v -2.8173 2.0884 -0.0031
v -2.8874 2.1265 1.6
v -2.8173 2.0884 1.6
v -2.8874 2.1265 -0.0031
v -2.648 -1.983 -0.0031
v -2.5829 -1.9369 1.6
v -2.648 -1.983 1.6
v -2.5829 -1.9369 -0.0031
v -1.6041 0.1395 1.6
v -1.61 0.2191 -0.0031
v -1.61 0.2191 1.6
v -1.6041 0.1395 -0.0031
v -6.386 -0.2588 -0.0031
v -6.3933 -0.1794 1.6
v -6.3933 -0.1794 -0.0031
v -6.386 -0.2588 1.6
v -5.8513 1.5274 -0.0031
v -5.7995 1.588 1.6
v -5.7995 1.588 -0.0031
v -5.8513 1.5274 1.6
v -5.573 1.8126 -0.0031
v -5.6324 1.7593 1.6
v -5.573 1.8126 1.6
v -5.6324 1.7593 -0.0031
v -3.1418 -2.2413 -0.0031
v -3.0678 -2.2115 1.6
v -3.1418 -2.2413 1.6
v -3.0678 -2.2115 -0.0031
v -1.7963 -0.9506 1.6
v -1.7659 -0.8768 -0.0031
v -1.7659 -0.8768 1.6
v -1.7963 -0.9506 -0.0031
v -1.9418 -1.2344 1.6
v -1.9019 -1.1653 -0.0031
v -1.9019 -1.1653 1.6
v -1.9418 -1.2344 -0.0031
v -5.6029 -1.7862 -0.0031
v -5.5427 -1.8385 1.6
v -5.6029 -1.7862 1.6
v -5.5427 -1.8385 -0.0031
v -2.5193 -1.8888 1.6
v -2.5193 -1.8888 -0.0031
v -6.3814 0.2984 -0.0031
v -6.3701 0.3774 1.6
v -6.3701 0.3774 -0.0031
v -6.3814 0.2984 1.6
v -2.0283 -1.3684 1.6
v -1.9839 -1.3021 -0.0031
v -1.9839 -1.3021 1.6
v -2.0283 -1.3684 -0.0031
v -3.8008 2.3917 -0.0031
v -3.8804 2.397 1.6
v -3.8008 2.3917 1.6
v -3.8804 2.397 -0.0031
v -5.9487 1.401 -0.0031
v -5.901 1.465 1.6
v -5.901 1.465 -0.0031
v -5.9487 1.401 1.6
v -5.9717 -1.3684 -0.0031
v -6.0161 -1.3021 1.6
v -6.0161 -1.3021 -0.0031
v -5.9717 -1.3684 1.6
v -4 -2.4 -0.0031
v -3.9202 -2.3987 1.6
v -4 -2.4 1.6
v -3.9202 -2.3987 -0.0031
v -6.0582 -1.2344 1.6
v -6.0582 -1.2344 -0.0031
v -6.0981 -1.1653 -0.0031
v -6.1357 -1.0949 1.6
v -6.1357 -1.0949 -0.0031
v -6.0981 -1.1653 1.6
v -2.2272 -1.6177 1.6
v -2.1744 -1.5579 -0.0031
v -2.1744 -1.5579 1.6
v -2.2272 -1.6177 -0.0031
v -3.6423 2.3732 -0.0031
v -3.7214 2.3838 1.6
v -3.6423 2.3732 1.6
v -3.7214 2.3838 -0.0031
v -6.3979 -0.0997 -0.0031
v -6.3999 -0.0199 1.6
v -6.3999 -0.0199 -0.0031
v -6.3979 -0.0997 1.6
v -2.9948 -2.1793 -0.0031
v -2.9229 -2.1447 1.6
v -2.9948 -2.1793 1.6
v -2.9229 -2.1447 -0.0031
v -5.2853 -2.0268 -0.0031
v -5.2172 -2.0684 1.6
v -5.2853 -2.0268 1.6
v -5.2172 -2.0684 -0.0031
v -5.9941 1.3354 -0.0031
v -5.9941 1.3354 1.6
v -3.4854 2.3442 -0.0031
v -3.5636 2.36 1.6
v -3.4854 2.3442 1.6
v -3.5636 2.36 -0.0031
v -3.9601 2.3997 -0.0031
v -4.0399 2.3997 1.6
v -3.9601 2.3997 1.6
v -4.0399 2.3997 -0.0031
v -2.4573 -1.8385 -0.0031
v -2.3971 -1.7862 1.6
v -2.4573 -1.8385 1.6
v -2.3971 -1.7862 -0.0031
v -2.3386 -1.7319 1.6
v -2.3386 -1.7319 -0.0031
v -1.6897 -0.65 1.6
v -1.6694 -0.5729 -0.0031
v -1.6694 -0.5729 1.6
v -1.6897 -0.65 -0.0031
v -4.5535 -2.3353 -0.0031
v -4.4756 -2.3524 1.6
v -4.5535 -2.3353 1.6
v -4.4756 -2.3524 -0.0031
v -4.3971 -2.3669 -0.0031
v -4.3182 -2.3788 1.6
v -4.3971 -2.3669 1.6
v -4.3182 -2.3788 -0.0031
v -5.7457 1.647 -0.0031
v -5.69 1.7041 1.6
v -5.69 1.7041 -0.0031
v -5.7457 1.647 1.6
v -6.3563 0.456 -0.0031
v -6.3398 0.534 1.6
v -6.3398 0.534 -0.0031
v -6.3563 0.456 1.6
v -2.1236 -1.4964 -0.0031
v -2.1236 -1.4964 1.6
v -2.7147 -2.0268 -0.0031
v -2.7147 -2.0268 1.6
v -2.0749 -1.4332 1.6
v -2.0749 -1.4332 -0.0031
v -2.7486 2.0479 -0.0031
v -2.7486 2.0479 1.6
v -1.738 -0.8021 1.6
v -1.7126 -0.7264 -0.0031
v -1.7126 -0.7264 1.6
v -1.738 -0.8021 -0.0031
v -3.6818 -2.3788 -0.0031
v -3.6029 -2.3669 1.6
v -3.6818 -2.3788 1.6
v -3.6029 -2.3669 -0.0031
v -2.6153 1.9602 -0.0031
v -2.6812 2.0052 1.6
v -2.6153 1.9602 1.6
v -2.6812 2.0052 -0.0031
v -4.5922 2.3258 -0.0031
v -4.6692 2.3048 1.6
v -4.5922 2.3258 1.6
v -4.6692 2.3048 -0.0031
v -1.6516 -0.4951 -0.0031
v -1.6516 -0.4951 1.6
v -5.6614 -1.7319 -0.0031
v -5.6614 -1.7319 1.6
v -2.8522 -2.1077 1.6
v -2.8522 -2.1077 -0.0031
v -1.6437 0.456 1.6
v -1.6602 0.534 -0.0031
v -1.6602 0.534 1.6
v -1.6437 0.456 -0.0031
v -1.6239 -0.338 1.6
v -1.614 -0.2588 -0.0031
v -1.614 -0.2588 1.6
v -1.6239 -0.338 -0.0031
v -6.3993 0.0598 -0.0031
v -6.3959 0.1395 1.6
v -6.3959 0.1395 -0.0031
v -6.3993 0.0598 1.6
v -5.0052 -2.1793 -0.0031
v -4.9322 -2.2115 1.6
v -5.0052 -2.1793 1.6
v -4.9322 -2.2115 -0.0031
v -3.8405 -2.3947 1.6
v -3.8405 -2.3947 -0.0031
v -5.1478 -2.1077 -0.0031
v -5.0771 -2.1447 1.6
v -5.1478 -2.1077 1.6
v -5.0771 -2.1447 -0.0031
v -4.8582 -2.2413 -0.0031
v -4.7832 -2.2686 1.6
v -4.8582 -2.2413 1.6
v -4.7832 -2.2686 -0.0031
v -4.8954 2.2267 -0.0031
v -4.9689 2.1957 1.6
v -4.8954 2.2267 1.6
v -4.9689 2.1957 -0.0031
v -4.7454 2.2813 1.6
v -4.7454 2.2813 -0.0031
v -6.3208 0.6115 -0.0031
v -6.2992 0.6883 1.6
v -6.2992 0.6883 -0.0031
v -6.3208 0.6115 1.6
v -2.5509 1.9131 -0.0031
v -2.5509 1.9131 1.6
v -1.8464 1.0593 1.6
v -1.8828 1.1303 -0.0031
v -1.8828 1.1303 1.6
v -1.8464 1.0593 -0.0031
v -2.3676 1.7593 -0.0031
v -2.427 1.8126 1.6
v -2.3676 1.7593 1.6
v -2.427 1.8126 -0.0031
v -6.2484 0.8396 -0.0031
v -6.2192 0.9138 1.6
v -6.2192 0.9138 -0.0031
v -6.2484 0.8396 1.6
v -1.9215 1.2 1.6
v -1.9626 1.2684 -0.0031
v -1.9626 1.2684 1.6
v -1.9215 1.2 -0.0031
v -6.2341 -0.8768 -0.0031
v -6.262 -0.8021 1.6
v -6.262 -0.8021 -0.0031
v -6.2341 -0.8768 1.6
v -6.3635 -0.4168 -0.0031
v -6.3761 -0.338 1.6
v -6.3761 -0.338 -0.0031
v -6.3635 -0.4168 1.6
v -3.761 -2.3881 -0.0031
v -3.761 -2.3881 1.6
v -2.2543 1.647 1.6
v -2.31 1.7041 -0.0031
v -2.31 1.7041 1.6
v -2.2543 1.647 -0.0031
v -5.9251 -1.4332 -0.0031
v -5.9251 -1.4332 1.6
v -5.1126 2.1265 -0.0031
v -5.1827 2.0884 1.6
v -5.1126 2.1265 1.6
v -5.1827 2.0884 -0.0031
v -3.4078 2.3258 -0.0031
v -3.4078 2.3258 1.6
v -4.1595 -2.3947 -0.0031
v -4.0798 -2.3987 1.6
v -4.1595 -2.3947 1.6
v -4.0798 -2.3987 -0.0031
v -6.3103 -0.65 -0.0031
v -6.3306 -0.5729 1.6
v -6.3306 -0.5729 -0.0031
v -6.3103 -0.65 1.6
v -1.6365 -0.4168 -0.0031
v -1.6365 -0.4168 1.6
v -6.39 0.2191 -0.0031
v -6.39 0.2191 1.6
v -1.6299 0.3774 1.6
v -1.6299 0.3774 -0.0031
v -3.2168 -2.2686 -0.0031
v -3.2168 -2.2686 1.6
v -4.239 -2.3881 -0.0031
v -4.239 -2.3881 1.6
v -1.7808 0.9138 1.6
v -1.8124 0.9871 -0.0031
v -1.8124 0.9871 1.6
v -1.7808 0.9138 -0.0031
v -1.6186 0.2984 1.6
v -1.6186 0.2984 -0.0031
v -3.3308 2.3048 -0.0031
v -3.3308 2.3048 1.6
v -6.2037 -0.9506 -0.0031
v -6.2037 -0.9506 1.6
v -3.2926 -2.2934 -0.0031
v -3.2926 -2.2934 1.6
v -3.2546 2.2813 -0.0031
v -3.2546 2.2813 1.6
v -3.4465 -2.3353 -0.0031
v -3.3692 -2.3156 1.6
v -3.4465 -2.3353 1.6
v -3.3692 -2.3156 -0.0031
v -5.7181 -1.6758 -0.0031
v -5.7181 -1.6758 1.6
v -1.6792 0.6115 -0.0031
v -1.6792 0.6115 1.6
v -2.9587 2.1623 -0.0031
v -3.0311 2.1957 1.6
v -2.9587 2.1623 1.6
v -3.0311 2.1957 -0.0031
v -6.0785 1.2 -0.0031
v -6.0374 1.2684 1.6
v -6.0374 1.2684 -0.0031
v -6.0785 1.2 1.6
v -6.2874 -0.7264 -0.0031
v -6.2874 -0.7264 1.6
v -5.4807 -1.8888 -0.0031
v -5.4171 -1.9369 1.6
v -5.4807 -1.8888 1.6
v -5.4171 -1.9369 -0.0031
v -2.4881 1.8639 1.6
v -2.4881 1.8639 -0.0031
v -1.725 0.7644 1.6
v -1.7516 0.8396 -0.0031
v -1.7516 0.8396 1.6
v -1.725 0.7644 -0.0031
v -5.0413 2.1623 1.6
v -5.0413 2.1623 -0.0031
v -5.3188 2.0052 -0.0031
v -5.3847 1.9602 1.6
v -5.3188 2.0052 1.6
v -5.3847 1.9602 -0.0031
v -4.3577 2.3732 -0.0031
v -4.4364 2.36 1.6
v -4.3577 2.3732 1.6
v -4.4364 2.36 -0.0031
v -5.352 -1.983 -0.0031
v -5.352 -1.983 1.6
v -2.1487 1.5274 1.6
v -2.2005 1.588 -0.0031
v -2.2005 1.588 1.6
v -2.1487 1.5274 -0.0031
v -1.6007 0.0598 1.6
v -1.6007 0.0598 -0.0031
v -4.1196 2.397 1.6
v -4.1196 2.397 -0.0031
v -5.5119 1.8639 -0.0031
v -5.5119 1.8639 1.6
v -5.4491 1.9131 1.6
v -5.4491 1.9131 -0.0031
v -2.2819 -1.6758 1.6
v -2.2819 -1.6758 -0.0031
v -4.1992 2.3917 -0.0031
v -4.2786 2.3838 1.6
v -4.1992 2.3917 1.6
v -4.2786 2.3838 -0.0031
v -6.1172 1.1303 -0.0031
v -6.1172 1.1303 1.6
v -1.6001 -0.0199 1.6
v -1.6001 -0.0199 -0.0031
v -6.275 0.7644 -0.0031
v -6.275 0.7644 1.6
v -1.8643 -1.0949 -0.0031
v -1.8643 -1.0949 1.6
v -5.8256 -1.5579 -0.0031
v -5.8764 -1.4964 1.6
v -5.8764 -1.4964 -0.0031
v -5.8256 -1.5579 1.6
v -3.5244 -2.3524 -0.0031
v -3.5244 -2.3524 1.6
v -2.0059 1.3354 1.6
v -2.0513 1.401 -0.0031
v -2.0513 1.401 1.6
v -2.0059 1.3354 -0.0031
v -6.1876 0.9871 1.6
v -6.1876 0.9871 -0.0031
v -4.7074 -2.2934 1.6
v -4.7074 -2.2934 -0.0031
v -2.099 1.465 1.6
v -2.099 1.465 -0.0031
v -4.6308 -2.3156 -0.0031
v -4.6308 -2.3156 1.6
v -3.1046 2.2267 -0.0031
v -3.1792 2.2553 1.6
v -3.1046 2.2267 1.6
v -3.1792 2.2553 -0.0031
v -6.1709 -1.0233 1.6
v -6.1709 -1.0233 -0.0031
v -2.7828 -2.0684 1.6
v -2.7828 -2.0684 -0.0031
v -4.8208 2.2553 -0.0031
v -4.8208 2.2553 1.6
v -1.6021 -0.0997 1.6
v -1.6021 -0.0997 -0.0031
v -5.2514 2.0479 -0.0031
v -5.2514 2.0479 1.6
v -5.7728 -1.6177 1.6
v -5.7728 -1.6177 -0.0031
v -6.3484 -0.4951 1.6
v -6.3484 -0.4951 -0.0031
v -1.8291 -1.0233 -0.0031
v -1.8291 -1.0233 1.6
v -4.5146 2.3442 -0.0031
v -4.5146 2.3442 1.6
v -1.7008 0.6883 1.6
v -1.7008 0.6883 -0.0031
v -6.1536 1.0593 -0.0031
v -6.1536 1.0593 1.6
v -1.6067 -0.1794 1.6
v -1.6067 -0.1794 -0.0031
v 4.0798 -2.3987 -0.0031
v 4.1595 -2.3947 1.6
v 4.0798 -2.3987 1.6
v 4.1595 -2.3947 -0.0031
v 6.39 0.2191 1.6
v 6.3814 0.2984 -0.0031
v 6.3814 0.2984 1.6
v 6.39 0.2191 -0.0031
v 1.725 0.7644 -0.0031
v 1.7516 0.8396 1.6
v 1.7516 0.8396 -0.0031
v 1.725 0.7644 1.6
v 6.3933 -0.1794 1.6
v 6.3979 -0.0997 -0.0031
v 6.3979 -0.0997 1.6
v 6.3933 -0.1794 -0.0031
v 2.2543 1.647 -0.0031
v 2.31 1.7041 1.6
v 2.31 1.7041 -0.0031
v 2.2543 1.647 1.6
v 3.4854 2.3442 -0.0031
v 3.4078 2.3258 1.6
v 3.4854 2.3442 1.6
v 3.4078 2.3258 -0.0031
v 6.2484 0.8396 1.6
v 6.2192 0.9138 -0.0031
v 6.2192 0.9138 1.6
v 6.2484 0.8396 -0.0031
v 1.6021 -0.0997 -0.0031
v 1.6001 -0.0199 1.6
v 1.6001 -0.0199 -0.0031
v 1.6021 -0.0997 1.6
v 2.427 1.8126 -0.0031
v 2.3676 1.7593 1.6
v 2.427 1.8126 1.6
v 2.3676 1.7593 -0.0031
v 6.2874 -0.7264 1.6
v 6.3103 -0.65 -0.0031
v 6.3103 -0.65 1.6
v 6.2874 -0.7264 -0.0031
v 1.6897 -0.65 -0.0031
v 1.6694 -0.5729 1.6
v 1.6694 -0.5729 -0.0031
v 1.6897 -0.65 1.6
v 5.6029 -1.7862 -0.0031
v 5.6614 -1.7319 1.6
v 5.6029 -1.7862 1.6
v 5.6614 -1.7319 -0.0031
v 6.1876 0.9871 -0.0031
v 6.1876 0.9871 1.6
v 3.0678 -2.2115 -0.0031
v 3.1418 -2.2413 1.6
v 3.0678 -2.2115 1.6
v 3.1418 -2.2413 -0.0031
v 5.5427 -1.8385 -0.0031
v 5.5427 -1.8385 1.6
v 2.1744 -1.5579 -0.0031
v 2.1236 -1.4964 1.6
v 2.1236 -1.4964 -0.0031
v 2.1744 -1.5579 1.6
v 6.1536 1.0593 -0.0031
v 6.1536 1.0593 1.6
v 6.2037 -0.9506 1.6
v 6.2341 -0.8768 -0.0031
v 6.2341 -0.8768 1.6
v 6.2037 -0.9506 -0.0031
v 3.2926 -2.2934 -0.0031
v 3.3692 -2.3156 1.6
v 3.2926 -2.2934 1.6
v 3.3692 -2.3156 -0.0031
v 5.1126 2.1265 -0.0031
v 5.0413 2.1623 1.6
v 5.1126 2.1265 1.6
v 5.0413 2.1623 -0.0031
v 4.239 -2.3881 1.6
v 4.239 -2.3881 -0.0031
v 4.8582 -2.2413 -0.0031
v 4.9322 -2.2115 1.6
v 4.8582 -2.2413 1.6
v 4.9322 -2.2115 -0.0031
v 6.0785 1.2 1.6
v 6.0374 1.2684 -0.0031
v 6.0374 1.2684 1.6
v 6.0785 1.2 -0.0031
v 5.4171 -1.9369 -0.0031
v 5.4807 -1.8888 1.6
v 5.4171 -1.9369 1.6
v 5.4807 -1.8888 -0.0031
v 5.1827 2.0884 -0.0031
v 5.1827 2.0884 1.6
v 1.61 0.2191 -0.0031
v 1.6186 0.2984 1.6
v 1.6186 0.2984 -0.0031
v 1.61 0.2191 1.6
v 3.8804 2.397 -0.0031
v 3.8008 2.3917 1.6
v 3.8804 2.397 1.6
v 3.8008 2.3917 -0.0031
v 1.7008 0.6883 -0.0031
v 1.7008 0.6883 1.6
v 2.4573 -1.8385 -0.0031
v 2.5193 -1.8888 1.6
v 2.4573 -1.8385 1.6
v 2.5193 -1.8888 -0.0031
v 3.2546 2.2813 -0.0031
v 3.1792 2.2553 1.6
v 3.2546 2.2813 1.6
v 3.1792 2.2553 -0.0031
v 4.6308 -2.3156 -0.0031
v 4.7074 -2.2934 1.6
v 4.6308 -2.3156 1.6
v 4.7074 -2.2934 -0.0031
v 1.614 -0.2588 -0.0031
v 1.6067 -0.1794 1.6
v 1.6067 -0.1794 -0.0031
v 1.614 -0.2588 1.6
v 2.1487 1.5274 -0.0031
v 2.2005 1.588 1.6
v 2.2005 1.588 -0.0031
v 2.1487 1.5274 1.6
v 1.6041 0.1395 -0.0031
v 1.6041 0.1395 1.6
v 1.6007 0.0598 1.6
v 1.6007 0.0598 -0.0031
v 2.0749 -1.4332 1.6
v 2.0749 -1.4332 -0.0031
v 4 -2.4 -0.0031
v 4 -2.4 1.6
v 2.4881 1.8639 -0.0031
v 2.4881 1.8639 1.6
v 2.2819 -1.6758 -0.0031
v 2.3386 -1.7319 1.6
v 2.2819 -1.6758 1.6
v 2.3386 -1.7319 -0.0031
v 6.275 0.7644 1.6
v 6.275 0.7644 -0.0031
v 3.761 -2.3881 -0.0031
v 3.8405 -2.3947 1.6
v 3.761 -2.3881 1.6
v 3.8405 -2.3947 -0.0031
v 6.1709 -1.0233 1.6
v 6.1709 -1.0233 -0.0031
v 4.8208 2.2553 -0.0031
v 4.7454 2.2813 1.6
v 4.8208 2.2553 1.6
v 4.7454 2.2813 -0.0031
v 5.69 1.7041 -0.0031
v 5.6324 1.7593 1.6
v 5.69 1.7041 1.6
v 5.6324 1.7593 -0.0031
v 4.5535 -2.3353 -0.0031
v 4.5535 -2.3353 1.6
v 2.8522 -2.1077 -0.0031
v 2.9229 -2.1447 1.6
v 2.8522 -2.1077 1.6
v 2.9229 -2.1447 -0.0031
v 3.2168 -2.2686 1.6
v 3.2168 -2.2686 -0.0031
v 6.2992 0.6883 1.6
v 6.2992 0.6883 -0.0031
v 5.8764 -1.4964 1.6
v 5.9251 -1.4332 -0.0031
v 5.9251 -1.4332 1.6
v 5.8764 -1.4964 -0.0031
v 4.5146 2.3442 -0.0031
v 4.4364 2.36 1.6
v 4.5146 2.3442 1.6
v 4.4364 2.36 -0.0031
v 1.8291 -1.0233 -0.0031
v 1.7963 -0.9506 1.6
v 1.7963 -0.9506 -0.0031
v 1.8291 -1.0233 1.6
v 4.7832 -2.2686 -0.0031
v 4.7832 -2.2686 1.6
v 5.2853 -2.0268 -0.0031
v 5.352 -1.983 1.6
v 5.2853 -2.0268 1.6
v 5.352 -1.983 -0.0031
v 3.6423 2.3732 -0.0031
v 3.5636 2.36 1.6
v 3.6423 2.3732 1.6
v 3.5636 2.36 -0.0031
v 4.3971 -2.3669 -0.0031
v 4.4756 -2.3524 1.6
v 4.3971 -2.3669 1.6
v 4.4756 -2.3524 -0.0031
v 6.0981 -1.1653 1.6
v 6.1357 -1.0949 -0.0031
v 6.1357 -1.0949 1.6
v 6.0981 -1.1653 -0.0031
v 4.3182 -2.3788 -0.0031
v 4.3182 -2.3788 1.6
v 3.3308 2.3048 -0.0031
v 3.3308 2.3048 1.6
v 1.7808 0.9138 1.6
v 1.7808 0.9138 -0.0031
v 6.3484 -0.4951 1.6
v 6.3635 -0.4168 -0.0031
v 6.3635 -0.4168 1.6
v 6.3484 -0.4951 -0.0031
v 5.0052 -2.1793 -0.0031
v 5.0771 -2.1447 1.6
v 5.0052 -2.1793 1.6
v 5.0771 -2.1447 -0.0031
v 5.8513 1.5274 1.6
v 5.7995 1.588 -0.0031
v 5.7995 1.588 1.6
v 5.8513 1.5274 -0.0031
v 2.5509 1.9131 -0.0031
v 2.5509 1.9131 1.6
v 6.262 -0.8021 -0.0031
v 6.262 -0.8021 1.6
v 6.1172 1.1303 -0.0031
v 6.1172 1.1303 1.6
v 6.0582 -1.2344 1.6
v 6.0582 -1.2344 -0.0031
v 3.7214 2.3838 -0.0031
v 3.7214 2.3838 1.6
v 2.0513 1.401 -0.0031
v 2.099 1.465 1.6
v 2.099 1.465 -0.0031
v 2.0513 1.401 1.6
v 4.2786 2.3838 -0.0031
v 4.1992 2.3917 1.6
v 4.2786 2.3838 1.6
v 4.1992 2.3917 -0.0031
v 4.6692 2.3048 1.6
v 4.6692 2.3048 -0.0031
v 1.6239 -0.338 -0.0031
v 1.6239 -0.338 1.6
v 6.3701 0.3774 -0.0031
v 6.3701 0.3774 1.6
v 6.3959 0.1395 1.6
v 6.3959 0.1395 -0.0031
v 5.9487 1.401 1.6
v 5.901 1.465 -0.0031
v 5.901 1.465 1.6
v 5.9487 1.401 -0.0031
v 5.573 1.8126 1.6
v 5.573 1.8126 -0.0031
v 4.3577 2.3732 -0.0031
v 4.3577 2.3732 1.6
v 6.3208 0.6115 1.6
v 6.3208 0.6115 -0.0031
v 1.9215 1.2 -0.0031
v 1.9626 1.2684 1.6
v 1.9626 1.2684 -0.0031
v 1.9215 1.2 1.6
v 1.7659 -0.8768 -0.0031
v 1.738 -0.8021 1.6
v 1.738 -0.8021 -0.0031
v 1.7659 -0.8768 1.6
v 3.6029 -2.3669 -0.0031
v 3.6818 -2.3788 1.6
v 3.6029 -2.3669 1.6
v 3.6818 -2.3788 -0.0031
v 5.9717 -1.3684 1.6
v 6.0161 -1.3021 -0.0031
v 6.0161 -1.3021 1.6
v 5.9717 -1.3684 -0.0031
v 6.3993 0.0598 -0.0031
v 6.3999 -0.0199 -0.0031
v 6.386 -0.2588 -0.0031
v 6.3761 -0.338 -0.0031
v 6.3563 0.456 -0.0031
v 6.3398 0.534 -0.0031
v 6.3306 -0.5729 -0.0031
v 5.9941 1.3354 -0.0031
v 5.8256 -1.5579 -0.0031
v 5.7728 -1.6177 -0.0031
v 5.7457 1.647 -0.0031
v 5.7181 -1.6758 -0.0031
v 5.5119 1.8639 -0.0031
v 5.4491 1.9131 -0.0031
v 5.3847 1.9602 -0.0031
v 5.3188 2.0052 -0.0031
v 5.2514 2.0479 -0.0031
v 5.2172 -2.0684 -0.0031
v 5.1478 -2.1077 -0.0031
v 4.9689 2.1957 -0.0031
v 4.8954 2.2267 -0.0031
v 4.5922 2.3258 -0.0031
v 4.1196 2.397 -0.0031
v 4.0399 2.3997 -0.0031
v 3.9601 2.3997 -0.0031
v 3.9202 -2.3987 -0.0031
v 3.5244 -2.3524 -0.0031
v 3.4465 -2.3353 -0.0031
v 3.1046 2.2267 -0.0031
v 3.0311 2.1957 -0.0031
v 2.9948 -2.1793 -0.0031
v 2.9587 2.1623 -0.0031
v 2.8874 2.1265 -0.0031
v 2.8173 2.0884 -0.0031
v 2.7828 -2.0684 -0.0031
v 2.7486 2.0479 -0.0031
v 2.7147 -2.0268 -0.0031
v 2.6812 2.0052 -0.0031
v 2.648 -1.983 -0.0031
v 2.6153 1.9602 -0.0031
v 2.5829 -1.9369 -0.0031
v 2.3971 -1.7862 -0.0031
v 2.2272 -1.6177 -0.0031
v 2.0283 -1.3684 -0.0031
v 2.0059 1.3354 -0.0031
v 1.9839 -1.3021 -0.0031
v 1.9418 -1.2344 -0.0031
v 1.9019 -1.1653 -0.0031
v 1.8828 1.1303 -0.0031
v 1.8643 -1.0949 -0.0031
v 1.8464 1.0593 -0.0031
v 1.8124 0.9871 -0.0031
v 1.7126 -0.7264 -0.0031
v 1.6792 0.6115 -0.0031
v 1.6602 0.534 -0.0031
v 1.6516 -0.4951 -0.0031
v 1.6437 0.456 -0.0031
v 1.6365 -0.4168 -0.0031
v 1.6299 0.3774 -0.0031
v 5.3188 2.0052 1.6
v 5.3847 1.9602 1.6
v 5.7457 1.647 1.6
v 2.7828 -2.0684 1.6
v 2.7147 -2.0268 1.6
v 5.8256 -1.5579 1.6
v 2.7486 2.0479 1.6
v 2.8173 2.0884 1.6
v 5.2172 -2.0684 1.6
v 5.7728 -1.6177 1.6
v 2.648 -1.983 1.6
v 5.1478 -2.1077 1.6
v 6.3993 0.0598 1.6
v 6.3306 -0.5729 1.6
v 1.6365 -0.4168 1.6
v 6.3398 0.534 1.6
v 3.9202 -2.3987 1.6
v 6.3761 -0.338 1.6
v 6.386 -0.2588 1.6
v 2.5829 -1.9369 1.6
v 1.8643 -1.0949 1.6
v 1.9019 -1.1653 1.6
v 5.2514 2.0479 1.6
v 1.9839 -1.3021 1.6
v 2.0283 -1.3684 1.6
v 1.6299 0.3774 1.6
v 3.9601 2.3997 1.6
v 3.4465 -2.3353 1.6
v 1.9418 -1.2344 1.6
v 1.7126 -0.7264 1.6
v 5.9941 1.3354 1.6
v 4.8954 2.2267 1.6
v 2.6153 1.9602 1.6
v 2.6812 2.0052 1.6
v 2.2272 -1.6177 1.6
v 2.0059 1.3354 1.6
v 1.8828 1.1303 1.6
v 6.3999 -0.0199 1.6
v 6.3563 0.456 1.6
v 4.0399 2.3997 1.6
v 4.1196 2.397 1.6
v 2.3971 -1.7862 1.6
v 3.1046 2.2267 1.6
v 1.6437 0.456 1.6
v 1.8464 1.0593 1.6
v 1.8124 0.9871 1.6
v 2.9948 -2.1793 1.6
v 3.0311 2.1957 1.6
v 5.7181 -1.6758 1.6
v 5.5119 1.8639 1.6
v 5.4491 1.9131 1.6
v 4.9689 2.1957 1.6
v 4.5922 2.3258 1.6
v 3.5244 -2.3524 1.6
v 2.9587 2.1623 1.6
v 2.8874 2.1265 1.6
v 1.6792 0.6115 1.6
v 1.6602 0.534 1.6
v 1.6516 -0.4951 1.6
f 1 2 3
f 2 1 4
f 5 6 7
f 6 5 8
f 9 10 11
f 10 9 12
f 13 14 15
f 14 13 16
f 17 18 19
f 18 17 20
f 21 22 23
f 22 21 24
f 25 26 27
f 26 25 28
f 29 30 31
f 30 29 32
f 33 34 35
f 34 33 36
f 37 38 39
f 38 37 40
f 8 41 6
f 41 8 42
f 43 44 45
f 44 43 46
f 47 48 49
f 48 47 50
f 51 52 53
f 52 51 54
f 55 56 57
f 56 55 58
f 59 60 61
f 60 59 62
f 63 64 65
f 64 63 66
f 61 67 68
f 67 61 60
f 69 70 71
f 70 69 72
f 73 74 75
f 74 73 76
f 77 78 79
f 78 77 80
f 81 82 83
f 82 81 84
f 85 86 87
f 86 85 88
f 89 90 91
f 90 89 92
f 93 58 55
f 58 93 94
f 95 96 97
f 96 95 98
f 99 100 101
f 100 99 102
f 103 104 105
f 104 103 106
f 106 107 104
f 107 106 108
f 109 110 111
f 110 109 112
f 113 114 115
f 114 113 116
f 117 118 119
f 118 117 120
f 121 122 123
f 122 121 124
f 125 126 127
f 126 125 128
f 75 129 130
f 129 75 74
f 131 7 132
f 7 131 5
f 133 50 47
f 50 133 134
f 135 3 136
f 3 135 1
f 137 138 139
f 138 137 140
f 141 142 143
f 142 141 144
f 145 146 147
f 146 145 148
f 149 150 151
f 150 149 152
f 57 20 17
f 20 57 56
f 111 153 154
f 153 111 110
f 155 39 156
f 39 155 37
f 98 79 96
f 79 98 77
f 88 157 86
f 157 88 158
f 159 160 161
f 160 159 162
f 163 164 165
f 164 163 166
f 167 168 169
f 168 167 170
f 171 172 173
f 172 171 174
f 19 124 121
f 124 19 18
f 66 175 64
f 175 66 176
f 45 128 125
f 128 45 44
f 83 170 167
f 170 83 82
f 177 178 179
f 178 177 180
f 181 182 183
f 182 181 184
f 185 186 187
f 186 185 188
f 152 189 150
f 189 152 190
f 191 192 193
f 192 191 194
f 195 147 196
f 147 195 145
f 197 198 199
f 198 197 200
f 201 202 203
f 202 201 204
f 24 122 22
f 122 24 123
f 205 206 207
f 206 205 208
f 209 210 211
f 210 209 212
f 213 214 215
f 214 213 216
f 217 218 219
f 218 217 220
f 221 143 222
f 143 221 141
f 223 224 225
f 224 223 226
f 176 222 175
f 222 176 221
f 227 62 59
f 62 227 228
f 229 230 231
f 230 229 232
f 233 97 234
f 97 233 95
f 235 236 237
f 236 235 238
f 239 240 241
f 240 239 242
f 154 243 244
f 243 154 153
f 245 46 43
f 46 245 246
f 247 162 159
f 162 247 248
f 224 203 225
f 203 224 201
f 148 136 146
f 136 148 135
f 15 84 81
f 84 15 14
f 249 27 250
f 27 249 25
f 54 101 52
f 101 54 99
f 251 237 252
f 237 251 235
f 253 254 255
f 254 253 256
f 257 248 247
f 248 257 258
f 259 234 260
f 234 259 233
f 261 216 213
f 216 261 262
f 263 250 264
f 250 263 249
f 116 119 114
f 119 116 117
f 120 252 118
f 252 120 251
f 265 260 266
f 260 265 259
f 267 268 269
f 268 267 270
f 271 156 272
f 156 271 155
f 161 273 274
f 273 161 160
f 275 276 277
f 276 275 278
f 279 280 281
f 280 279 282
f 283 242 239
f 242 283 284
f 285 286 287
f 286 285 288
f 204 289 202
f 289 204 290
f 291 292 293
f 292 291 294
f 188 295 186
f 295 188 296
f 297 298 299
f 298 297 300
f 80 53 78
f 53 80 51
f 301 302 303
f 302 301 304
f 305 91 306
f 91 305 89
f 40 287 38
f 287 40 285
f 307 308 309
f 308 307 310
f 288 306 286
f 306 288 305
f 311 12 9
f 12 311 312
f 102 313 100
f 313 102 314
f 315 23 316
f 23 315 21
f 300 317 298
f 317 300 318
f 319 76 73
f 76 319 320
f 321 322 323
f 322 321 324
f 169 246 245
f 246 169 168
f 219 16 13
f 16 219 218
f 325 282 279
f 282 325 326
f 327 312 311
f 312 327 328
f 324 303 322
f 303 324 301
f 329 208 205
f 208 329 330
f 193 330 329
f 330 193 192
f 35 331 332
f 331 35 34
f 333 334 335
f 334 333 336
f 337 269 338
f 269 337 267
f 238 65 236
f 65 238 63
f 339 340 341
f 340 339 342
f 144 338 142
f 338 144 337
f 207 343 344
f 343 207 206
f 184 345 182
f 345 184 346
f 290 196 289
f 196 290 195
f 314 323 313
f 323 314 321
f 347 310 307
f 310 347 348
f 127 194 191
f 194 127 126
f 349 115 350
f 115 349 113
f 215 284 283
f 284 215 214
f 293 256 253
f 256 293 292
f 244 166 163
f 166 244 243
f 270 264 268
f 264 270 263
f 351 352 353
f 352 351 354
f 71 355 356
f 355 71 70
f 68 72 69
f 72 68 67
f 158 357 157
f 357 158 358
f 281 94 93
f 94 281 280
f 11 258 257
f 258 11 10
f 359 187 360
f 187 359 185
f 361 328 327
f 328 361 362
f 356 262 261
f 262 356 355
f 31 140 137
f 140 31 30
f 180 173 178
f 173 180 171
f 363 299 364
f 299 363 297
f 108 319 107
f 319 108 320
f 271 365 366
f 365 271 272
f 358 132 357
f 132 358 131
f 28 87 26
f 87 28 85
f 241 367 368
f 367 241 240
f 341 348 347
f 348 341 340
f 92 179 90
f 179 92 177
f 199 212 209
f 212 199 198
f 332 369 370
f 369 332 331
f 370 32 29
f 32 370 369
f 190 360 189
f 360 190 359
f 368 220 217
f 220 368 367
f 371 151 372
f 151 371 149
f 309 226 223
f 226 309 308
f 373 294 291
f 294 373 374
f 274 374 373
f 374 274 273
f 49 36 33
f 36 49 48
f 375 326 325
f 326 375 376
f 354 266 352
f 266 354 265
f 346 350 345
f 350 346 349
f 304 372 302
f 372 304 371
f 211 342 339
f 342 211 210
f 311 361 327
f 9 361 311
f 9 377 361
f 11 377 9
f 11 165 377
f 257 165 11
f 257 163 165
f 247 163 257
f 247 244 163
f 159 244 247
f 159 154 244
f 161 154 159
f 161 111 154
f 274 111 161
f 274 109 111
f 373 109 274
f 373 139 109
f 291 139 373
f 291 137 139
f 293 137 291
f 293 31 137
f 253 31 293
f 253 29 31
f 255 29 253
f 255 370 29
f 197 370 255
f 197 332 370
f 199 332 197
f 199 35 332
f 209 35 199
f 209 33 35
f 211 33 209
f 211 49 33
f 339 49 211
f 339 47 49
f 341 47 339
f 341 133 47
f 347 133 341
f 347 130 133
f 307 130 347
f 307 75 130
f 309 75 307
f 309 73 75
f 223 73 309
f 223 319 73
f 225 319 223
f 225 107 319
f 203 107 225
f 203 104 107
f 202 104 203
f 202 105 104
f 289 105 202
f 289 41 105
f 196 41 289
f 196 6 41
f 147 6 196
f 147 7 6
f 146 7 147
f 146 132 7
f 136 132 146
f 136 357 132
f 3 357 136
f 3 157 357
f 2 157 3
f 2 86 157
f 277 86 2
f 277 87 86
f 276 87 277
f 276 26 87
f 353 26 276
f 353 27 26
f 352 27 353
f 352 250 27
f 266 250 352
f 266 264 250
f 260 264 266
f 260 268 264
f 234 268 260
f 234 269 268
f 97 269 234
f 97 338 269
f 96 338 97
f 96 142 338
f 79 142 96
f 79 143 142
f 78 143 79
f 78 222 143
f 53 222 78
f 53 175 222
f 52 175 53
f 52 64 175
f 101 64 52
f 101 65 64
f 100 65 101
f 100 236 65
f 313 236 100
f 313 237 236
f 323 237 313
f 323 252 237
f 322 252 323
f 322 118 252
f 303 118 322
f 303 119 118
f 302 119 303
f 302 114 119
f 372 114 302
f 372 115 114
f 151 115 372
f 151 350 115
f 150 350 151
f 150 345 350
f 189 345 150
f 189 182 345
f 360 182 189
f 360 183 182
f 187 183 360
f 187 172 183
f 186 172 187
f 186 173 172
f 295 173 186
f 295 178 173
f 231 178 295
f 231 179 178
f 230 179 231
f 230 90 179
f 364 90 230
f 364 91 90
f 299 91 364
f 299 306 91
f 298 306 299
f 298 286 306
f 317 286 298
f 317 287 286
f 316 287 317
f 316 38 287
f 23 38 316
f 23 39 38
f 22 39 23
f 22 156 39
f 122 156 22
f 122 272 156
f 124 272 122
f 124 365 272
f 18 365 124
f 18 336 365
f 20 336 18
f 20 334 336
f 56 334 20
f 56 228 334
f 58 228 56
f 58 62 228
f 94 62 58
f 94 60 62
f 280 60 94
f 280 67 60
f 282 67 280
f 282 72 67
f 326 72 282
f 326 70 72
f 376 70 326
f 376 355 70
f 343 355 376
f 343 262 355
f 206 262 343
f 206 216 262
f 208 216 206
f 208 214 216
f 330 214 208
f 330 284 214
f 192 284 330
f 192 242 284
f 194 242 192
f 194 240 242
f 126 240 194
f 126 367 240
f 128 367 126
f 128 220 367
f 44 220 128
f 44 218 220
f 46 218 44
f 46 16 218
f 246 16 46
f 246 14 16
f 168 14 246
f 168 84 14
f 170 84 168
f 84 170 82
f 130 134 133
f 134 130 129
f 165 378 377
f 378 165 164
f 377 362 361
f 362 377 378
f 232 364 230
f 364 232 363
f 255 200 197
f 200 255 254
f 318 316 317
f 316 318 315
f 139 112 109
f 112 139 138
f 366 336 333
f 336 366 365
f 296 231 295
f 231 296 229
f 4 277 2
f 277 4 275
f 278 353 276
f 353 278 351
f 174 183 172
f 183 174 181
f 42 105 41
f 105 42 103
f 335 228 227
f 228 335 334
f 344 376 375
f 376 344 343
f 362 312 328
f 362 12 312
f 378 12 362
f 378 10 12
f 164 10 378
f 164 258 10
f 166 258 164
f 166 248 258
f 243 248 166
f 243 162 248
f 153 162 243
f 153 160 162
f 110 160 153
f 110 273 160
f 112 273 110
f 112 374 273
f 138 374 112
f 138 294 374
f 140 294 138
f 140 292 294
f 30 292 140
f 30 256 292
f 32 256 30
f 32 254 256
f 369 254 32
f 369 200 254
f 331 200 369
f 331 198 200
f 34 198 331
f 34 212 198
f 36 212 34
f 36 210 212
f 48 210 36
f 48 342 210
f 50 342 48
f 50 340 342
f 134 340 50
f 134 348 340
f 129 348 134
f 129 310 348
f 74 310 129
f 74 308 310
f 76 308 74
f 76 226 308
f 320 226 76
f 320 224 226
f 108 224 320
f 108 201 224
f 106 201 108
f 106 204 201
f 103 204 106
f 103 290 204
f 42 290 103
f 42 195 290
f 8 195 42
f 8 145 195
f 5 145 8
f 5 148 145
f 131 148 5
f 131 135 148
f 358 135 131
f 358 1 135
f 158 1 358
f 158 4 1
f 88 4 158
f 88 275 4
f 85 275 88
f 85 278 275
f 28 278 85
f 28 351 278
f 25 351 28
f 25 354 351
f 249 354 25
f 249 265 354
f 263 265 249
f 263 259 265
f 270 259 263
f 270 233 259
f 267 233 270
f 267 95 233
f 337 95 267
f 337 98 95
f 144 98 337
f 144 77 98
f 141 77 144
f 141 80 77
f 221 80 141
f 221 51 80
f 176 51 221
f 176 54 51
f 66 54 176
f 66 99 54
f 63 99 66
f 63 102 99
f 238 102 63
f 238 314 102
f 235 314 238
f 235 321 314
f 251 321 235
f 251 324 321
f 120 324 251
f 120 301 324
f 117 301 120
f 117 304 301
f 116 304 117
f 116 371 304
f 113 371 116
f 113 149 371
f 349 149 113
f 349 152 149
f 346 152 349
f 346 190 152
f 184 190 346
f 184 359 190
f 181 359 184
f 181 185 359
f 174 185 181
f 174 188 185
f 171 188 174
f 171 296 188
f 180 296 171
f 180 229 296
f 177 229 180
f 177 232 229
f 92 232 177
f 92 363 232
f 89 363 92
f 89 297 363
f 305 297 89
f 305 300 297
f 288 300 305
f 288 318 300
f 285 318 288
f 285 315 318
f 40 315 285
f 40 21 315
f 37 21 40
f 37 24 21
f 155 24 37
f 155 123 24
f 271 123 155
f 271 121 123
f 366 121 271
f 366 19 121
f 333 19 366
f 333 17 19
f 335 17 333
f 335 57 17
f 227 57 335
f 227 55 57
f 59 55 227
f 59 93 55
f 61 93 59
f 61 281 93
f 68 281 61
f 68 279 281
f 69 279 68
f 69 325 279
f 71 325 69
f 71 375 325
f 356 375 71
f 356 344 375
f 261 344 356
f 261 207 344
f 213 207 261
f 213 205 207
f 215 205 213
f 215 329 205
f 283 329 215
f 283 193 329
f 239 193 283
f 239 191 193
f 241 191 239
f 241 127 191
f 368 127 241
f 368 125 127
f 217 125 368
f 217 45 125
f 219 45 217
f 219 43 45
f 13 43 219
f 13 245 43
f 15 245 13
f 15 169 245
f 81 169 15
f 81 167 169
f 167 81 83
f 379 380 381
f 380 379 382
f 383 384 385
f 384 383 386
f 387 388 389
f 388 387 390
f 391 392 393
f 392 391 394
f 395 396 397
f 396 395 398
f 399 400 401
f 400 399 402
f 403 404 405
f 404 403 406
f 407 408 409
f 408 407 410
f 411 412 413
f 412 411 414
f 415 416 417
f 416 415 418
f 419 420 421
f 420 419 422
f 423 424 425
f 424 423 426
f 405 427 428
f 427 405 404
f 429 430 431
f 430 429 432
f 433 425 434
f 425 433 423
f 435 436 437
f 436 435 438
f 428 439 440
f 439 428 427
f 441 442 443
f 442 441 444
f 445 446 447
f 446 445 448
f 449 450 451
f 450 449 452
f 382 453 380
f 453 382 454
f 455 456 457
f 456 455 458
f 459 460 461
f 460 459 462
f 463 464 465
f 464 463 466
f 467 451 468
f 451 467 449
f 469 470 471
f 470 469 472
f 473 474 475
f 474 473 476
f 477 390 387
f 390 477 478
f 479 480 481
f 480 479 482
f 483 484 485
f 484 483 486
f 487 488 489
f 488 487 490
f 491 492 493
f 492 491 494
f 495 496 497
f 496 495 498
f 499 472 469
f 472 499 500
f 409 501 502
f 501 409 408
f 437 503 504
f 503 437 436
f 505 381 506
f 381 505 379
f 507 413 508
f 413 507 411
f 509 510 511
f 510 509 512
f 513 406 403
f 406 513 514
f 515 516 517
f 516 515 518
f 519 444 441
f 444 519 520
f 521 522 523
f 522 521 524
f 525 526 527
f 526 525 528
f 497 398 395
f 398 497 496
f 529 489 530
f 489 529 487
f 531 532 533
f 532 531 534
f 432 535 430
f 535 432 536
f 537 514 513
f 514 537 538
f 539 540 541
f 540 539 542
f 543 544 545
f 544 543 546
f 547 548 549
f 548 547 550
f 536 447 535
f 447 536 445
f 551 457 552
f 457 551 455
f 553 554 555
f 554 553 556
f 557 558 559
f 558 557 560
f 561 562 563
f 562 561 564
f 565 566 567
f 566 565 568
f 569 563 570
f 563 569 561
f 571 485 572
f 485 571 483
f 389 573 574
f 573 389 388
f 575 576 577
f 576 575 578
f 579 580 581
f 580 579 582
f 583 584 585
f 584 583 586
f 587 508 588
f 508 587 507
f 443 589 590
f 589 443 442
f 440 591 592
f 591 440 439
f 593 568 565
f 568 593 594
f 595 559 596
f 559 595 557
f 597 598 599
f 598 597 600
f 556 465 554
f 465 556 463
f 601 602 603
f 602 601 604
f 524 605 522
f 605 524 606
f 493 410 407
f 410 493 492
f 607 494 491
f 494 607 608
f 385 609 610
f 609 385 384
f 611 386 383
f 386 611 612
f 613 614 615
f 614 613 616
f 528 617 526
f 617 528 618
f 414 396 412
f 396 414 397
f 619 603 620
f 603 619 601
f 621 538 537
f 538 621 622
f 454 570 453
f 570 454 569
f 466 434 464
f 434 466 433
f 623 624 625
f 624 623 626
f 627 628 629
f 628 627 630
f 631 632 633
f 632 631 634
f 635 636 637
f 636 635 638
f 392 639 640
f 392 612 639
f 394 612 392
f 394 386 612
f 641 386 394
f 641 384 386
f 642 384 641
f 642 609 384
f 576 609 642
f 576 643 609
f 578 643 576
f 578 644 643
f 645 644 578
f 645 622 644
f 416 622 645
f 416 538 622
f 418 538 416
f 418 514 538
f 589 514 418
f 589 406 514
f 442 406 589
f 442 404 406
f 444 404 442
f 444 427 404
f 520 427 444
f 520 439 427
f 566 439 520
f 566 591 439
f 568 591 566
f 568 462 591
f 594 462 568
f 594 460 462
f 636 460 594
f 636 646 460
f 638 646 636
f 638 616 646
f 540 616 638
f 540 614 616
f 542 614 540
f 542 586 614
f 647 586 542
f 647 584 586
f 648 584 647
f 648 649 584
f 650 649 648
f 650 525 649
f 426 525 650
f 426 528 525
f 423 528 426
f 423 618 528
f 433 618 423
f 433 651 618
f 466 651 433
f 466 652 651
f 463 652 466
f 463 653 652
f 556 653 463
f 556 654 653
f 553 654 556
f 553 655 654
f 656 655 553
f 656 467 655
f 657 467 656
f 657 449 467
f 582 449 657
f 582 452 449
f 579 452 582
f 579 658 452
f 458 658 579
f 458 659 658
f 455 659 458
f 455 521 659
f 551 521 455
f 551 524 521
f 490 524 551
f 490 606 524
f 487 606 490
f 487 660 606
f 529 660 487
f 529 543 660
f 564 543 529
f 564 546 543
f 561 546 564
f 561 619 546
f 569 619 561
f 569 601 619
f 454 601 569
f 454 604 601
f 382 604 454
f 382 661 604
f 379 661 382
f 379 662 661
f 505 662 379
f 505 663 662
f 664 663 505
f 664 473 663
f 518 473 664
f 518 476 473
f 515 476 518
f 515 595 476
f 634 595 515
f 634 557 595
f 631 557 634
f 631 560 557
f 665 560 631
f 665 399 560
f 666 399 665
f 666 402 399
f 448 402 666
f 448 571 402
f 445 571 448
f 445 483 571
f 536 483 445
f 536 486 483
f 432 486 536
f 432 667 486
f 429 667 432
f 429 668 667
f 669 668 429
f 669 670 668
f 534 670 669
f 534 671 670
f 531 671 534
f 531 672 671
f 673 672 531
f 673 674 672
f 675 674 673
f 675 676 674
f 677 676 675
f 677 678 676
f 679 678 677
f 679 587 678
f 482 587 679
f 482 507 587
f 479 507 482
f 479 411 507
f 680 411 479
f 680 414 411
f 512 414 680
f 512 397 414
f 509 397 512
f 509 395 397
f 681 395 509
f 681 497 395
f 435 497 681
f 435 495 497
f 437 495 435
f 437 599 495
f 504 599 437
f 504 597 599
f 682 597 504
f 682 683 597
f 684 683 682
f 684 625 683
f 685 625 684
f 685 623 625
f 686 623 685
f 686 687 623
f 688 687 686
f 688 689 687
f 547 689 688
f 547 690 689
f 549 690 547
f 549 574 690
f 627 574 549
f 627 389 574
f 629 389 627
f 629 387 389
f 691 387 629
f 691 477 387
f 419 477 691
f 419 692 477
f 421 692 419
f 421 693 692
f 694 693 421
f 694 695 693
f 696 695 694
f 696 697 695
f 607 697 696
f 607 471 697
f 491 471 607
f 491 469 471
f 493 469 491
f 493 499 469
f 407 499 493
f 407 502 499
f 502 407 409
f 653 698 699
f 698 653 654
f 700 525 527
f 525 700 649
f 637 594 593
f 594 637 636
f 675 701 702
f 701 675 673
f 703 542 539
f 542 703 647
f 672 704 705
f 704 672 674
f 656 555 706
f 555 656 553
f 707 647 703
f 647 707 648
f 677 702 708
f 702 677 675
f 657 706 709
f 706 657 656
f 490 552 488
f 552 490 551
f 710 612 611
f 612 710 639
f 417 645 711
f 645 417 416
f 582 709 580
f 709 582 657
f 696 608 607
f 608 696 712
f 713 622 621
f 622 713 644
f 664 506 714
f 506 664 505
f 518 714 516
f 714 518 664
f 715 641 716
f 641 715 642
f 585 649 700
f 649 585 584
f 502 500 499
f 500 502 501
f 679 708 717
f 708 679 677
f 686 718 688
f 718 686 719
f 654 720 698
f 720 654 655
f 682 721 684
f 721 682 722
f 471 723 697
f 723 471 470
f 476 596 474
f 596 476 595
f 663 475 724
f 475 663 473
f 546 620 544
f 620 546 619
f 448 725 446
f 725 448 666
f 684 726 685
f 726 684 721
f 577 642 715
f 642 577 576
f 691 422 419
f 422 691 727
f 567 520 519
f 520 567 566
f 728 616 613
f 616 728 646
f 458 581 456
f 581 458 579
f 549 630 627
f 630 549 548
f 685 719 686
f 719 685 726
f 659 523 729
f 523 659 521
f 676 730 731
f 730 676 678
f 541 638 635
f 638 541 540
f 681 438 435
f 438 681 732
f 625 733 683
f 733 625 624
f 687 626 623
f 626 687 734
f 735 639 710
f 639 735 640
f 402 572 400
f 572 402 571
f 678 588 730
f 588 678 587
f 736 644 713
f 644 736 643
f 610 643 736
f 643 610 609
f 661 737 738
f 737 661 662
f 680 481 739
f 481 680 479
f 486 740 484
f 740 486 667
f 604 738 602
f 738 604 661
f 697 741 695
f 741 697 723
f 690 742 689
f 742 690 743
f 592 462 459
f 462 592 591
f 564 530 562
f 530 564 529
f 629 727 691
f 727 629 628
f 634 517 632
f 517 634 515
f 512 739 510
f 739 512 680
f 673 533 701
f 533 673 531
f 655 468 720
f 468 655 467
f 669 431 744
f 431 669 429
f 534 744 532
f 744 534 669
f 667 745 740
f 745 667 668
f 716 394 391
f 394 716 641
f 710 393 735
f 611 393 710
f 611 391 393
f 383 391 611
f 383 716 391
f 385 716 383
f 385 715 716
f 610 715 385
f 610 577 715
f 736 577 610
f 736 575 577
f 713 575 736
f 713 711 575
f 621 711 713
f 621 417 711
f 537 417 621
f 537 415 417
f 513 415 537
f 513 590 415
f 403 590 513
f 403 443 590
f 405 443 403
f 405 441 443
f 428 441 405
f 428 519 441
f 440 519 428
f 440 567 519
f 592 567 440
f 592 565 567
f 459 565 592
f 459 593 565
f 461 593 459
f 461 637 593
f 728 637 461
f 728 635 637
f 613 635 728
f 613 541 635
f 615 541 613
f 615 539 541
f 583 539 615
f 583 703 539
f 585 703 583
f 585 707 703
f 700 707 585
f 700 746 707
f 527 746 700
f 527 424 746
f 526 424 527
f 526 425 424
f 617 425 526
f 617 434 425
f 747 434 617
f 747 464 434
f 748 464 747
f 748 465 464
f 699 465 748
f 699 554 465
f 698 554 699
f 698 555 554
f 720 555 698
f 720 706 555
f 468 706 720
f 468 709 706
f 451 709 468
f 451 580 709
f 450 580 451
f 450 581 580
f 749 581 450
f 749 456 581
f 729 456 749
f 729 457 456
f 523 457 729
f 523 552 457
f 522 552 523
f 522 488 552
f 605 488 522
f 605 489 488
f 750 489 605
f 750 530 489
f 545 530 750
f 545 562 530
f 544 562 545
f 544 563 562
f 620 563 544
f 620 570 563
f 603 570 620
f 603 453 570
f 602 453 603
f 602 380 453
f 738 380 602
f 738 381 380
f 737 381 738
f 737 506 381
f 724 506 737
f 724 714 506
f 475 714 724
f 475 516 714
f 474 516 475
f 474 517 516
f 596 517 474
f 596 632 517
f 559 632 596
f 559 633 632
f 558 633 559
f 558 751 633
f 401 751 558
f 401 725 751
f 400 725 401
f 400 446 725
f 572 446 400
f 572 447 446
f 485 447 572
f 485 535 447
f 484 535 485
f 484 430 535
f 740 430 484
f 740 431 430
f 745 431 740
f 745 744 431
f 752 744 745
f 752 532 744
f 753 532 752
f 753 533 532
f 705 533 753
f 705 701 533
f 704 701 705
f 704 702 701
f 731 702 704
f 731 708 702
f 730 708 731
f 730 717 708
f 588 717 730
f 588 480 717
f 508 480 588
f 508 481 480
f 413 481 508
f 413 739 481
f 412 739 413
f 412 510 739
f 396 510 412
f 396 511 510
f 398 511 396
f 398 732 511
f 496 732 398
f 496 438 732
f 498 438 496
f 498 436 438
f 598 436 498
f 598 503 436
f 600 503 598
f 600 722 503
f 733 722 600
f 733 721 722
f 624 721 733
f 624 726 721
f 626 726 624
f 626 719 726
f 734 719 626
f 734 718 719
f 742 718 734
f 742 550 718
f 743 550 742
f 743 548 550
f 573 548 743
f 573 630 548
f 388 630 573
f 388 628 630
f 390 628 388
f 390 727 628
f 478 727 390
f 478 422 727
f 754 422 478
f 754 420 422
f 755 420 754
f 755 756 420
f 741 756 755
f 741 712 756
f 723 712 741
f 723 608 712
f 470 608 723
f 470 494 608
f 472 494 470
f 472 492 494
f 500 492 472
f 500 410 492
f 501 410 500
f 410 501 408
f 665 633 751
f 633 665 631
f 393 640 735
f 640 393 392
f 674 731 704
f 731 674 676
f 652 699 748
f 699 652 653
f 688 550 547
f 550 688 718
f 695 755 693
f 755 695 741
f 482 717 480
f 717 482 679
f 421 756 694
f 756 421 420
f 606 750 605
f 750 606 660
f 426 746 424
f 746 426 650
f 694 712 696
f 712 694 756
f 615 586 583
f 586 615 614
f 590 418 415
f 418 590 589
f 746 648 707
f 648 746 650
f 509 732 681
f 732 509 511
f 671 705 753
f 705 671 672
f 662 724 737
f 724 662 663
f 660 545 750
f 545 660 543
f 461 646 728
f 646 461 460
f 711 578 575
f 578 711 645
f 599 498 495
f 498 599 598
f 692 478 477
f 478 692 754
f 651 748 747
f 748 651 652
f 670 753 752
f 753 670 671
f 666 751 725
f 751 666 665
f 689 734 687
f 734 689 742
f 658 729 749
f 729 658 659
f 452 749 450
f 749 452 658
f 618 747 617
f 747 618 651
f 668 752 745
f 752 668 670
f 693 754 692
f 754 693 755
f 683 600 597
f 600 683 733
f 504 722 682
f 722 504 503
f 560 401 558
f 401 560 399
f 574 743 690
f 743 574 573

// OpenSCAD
use <../lib.scad>
use <3039ps1.scad>
$fa=1; $fs=0.2;
function ldraw_lib__3039p101(realsolid=false) = [
// 0 ~Moved to 3039ps1
// 0 Name: 3039p101.dat
// 0 Author: [PTadmin]
// 0 !LDRAW_ORG Part UPDATE 2002-03
// 0 !LICENSE Licensed under CC BY 4.0 : see CAreadme.txt
// 
// 0 BFC CERTIFY CCW
  [0,"BFC","CERTIFY"],
  [0,"BFC","CCW"],
// 
// 0 !HISTORY 1999-12-31 [PTadmin] Official Update 1999-06
// 0 !HISTORY 2002-06-11 [PTadmin] Official Update 2002-03
// 0 !HISTORY 2007-06-09 [PTadmin] Header formatted for Contributor Agreement
// 0 !HISTORY 2008-07-01 [PTadmin] Official Update 2008-01
// 
// 
// 1 16 0 0 0 1 0 0 0 1 0 0 0 1 3039ps1.dat
  [1,16,0,0,0,1,0,0,0,1,0,0,0,1, ldraw_lib__3039ps1(realsolid)],
];
module ldraw_lib__3039p101(step=0, col=false, unit=2/5, alt=false, line=0.2, solid=!$preview)
    makepoly(ldraw_lib__3039p101(solid), step=step, col=col, unit=unit, alt=alt, line=line, solid=solid);
ldraw_lib__3039p101(line=0.2);
